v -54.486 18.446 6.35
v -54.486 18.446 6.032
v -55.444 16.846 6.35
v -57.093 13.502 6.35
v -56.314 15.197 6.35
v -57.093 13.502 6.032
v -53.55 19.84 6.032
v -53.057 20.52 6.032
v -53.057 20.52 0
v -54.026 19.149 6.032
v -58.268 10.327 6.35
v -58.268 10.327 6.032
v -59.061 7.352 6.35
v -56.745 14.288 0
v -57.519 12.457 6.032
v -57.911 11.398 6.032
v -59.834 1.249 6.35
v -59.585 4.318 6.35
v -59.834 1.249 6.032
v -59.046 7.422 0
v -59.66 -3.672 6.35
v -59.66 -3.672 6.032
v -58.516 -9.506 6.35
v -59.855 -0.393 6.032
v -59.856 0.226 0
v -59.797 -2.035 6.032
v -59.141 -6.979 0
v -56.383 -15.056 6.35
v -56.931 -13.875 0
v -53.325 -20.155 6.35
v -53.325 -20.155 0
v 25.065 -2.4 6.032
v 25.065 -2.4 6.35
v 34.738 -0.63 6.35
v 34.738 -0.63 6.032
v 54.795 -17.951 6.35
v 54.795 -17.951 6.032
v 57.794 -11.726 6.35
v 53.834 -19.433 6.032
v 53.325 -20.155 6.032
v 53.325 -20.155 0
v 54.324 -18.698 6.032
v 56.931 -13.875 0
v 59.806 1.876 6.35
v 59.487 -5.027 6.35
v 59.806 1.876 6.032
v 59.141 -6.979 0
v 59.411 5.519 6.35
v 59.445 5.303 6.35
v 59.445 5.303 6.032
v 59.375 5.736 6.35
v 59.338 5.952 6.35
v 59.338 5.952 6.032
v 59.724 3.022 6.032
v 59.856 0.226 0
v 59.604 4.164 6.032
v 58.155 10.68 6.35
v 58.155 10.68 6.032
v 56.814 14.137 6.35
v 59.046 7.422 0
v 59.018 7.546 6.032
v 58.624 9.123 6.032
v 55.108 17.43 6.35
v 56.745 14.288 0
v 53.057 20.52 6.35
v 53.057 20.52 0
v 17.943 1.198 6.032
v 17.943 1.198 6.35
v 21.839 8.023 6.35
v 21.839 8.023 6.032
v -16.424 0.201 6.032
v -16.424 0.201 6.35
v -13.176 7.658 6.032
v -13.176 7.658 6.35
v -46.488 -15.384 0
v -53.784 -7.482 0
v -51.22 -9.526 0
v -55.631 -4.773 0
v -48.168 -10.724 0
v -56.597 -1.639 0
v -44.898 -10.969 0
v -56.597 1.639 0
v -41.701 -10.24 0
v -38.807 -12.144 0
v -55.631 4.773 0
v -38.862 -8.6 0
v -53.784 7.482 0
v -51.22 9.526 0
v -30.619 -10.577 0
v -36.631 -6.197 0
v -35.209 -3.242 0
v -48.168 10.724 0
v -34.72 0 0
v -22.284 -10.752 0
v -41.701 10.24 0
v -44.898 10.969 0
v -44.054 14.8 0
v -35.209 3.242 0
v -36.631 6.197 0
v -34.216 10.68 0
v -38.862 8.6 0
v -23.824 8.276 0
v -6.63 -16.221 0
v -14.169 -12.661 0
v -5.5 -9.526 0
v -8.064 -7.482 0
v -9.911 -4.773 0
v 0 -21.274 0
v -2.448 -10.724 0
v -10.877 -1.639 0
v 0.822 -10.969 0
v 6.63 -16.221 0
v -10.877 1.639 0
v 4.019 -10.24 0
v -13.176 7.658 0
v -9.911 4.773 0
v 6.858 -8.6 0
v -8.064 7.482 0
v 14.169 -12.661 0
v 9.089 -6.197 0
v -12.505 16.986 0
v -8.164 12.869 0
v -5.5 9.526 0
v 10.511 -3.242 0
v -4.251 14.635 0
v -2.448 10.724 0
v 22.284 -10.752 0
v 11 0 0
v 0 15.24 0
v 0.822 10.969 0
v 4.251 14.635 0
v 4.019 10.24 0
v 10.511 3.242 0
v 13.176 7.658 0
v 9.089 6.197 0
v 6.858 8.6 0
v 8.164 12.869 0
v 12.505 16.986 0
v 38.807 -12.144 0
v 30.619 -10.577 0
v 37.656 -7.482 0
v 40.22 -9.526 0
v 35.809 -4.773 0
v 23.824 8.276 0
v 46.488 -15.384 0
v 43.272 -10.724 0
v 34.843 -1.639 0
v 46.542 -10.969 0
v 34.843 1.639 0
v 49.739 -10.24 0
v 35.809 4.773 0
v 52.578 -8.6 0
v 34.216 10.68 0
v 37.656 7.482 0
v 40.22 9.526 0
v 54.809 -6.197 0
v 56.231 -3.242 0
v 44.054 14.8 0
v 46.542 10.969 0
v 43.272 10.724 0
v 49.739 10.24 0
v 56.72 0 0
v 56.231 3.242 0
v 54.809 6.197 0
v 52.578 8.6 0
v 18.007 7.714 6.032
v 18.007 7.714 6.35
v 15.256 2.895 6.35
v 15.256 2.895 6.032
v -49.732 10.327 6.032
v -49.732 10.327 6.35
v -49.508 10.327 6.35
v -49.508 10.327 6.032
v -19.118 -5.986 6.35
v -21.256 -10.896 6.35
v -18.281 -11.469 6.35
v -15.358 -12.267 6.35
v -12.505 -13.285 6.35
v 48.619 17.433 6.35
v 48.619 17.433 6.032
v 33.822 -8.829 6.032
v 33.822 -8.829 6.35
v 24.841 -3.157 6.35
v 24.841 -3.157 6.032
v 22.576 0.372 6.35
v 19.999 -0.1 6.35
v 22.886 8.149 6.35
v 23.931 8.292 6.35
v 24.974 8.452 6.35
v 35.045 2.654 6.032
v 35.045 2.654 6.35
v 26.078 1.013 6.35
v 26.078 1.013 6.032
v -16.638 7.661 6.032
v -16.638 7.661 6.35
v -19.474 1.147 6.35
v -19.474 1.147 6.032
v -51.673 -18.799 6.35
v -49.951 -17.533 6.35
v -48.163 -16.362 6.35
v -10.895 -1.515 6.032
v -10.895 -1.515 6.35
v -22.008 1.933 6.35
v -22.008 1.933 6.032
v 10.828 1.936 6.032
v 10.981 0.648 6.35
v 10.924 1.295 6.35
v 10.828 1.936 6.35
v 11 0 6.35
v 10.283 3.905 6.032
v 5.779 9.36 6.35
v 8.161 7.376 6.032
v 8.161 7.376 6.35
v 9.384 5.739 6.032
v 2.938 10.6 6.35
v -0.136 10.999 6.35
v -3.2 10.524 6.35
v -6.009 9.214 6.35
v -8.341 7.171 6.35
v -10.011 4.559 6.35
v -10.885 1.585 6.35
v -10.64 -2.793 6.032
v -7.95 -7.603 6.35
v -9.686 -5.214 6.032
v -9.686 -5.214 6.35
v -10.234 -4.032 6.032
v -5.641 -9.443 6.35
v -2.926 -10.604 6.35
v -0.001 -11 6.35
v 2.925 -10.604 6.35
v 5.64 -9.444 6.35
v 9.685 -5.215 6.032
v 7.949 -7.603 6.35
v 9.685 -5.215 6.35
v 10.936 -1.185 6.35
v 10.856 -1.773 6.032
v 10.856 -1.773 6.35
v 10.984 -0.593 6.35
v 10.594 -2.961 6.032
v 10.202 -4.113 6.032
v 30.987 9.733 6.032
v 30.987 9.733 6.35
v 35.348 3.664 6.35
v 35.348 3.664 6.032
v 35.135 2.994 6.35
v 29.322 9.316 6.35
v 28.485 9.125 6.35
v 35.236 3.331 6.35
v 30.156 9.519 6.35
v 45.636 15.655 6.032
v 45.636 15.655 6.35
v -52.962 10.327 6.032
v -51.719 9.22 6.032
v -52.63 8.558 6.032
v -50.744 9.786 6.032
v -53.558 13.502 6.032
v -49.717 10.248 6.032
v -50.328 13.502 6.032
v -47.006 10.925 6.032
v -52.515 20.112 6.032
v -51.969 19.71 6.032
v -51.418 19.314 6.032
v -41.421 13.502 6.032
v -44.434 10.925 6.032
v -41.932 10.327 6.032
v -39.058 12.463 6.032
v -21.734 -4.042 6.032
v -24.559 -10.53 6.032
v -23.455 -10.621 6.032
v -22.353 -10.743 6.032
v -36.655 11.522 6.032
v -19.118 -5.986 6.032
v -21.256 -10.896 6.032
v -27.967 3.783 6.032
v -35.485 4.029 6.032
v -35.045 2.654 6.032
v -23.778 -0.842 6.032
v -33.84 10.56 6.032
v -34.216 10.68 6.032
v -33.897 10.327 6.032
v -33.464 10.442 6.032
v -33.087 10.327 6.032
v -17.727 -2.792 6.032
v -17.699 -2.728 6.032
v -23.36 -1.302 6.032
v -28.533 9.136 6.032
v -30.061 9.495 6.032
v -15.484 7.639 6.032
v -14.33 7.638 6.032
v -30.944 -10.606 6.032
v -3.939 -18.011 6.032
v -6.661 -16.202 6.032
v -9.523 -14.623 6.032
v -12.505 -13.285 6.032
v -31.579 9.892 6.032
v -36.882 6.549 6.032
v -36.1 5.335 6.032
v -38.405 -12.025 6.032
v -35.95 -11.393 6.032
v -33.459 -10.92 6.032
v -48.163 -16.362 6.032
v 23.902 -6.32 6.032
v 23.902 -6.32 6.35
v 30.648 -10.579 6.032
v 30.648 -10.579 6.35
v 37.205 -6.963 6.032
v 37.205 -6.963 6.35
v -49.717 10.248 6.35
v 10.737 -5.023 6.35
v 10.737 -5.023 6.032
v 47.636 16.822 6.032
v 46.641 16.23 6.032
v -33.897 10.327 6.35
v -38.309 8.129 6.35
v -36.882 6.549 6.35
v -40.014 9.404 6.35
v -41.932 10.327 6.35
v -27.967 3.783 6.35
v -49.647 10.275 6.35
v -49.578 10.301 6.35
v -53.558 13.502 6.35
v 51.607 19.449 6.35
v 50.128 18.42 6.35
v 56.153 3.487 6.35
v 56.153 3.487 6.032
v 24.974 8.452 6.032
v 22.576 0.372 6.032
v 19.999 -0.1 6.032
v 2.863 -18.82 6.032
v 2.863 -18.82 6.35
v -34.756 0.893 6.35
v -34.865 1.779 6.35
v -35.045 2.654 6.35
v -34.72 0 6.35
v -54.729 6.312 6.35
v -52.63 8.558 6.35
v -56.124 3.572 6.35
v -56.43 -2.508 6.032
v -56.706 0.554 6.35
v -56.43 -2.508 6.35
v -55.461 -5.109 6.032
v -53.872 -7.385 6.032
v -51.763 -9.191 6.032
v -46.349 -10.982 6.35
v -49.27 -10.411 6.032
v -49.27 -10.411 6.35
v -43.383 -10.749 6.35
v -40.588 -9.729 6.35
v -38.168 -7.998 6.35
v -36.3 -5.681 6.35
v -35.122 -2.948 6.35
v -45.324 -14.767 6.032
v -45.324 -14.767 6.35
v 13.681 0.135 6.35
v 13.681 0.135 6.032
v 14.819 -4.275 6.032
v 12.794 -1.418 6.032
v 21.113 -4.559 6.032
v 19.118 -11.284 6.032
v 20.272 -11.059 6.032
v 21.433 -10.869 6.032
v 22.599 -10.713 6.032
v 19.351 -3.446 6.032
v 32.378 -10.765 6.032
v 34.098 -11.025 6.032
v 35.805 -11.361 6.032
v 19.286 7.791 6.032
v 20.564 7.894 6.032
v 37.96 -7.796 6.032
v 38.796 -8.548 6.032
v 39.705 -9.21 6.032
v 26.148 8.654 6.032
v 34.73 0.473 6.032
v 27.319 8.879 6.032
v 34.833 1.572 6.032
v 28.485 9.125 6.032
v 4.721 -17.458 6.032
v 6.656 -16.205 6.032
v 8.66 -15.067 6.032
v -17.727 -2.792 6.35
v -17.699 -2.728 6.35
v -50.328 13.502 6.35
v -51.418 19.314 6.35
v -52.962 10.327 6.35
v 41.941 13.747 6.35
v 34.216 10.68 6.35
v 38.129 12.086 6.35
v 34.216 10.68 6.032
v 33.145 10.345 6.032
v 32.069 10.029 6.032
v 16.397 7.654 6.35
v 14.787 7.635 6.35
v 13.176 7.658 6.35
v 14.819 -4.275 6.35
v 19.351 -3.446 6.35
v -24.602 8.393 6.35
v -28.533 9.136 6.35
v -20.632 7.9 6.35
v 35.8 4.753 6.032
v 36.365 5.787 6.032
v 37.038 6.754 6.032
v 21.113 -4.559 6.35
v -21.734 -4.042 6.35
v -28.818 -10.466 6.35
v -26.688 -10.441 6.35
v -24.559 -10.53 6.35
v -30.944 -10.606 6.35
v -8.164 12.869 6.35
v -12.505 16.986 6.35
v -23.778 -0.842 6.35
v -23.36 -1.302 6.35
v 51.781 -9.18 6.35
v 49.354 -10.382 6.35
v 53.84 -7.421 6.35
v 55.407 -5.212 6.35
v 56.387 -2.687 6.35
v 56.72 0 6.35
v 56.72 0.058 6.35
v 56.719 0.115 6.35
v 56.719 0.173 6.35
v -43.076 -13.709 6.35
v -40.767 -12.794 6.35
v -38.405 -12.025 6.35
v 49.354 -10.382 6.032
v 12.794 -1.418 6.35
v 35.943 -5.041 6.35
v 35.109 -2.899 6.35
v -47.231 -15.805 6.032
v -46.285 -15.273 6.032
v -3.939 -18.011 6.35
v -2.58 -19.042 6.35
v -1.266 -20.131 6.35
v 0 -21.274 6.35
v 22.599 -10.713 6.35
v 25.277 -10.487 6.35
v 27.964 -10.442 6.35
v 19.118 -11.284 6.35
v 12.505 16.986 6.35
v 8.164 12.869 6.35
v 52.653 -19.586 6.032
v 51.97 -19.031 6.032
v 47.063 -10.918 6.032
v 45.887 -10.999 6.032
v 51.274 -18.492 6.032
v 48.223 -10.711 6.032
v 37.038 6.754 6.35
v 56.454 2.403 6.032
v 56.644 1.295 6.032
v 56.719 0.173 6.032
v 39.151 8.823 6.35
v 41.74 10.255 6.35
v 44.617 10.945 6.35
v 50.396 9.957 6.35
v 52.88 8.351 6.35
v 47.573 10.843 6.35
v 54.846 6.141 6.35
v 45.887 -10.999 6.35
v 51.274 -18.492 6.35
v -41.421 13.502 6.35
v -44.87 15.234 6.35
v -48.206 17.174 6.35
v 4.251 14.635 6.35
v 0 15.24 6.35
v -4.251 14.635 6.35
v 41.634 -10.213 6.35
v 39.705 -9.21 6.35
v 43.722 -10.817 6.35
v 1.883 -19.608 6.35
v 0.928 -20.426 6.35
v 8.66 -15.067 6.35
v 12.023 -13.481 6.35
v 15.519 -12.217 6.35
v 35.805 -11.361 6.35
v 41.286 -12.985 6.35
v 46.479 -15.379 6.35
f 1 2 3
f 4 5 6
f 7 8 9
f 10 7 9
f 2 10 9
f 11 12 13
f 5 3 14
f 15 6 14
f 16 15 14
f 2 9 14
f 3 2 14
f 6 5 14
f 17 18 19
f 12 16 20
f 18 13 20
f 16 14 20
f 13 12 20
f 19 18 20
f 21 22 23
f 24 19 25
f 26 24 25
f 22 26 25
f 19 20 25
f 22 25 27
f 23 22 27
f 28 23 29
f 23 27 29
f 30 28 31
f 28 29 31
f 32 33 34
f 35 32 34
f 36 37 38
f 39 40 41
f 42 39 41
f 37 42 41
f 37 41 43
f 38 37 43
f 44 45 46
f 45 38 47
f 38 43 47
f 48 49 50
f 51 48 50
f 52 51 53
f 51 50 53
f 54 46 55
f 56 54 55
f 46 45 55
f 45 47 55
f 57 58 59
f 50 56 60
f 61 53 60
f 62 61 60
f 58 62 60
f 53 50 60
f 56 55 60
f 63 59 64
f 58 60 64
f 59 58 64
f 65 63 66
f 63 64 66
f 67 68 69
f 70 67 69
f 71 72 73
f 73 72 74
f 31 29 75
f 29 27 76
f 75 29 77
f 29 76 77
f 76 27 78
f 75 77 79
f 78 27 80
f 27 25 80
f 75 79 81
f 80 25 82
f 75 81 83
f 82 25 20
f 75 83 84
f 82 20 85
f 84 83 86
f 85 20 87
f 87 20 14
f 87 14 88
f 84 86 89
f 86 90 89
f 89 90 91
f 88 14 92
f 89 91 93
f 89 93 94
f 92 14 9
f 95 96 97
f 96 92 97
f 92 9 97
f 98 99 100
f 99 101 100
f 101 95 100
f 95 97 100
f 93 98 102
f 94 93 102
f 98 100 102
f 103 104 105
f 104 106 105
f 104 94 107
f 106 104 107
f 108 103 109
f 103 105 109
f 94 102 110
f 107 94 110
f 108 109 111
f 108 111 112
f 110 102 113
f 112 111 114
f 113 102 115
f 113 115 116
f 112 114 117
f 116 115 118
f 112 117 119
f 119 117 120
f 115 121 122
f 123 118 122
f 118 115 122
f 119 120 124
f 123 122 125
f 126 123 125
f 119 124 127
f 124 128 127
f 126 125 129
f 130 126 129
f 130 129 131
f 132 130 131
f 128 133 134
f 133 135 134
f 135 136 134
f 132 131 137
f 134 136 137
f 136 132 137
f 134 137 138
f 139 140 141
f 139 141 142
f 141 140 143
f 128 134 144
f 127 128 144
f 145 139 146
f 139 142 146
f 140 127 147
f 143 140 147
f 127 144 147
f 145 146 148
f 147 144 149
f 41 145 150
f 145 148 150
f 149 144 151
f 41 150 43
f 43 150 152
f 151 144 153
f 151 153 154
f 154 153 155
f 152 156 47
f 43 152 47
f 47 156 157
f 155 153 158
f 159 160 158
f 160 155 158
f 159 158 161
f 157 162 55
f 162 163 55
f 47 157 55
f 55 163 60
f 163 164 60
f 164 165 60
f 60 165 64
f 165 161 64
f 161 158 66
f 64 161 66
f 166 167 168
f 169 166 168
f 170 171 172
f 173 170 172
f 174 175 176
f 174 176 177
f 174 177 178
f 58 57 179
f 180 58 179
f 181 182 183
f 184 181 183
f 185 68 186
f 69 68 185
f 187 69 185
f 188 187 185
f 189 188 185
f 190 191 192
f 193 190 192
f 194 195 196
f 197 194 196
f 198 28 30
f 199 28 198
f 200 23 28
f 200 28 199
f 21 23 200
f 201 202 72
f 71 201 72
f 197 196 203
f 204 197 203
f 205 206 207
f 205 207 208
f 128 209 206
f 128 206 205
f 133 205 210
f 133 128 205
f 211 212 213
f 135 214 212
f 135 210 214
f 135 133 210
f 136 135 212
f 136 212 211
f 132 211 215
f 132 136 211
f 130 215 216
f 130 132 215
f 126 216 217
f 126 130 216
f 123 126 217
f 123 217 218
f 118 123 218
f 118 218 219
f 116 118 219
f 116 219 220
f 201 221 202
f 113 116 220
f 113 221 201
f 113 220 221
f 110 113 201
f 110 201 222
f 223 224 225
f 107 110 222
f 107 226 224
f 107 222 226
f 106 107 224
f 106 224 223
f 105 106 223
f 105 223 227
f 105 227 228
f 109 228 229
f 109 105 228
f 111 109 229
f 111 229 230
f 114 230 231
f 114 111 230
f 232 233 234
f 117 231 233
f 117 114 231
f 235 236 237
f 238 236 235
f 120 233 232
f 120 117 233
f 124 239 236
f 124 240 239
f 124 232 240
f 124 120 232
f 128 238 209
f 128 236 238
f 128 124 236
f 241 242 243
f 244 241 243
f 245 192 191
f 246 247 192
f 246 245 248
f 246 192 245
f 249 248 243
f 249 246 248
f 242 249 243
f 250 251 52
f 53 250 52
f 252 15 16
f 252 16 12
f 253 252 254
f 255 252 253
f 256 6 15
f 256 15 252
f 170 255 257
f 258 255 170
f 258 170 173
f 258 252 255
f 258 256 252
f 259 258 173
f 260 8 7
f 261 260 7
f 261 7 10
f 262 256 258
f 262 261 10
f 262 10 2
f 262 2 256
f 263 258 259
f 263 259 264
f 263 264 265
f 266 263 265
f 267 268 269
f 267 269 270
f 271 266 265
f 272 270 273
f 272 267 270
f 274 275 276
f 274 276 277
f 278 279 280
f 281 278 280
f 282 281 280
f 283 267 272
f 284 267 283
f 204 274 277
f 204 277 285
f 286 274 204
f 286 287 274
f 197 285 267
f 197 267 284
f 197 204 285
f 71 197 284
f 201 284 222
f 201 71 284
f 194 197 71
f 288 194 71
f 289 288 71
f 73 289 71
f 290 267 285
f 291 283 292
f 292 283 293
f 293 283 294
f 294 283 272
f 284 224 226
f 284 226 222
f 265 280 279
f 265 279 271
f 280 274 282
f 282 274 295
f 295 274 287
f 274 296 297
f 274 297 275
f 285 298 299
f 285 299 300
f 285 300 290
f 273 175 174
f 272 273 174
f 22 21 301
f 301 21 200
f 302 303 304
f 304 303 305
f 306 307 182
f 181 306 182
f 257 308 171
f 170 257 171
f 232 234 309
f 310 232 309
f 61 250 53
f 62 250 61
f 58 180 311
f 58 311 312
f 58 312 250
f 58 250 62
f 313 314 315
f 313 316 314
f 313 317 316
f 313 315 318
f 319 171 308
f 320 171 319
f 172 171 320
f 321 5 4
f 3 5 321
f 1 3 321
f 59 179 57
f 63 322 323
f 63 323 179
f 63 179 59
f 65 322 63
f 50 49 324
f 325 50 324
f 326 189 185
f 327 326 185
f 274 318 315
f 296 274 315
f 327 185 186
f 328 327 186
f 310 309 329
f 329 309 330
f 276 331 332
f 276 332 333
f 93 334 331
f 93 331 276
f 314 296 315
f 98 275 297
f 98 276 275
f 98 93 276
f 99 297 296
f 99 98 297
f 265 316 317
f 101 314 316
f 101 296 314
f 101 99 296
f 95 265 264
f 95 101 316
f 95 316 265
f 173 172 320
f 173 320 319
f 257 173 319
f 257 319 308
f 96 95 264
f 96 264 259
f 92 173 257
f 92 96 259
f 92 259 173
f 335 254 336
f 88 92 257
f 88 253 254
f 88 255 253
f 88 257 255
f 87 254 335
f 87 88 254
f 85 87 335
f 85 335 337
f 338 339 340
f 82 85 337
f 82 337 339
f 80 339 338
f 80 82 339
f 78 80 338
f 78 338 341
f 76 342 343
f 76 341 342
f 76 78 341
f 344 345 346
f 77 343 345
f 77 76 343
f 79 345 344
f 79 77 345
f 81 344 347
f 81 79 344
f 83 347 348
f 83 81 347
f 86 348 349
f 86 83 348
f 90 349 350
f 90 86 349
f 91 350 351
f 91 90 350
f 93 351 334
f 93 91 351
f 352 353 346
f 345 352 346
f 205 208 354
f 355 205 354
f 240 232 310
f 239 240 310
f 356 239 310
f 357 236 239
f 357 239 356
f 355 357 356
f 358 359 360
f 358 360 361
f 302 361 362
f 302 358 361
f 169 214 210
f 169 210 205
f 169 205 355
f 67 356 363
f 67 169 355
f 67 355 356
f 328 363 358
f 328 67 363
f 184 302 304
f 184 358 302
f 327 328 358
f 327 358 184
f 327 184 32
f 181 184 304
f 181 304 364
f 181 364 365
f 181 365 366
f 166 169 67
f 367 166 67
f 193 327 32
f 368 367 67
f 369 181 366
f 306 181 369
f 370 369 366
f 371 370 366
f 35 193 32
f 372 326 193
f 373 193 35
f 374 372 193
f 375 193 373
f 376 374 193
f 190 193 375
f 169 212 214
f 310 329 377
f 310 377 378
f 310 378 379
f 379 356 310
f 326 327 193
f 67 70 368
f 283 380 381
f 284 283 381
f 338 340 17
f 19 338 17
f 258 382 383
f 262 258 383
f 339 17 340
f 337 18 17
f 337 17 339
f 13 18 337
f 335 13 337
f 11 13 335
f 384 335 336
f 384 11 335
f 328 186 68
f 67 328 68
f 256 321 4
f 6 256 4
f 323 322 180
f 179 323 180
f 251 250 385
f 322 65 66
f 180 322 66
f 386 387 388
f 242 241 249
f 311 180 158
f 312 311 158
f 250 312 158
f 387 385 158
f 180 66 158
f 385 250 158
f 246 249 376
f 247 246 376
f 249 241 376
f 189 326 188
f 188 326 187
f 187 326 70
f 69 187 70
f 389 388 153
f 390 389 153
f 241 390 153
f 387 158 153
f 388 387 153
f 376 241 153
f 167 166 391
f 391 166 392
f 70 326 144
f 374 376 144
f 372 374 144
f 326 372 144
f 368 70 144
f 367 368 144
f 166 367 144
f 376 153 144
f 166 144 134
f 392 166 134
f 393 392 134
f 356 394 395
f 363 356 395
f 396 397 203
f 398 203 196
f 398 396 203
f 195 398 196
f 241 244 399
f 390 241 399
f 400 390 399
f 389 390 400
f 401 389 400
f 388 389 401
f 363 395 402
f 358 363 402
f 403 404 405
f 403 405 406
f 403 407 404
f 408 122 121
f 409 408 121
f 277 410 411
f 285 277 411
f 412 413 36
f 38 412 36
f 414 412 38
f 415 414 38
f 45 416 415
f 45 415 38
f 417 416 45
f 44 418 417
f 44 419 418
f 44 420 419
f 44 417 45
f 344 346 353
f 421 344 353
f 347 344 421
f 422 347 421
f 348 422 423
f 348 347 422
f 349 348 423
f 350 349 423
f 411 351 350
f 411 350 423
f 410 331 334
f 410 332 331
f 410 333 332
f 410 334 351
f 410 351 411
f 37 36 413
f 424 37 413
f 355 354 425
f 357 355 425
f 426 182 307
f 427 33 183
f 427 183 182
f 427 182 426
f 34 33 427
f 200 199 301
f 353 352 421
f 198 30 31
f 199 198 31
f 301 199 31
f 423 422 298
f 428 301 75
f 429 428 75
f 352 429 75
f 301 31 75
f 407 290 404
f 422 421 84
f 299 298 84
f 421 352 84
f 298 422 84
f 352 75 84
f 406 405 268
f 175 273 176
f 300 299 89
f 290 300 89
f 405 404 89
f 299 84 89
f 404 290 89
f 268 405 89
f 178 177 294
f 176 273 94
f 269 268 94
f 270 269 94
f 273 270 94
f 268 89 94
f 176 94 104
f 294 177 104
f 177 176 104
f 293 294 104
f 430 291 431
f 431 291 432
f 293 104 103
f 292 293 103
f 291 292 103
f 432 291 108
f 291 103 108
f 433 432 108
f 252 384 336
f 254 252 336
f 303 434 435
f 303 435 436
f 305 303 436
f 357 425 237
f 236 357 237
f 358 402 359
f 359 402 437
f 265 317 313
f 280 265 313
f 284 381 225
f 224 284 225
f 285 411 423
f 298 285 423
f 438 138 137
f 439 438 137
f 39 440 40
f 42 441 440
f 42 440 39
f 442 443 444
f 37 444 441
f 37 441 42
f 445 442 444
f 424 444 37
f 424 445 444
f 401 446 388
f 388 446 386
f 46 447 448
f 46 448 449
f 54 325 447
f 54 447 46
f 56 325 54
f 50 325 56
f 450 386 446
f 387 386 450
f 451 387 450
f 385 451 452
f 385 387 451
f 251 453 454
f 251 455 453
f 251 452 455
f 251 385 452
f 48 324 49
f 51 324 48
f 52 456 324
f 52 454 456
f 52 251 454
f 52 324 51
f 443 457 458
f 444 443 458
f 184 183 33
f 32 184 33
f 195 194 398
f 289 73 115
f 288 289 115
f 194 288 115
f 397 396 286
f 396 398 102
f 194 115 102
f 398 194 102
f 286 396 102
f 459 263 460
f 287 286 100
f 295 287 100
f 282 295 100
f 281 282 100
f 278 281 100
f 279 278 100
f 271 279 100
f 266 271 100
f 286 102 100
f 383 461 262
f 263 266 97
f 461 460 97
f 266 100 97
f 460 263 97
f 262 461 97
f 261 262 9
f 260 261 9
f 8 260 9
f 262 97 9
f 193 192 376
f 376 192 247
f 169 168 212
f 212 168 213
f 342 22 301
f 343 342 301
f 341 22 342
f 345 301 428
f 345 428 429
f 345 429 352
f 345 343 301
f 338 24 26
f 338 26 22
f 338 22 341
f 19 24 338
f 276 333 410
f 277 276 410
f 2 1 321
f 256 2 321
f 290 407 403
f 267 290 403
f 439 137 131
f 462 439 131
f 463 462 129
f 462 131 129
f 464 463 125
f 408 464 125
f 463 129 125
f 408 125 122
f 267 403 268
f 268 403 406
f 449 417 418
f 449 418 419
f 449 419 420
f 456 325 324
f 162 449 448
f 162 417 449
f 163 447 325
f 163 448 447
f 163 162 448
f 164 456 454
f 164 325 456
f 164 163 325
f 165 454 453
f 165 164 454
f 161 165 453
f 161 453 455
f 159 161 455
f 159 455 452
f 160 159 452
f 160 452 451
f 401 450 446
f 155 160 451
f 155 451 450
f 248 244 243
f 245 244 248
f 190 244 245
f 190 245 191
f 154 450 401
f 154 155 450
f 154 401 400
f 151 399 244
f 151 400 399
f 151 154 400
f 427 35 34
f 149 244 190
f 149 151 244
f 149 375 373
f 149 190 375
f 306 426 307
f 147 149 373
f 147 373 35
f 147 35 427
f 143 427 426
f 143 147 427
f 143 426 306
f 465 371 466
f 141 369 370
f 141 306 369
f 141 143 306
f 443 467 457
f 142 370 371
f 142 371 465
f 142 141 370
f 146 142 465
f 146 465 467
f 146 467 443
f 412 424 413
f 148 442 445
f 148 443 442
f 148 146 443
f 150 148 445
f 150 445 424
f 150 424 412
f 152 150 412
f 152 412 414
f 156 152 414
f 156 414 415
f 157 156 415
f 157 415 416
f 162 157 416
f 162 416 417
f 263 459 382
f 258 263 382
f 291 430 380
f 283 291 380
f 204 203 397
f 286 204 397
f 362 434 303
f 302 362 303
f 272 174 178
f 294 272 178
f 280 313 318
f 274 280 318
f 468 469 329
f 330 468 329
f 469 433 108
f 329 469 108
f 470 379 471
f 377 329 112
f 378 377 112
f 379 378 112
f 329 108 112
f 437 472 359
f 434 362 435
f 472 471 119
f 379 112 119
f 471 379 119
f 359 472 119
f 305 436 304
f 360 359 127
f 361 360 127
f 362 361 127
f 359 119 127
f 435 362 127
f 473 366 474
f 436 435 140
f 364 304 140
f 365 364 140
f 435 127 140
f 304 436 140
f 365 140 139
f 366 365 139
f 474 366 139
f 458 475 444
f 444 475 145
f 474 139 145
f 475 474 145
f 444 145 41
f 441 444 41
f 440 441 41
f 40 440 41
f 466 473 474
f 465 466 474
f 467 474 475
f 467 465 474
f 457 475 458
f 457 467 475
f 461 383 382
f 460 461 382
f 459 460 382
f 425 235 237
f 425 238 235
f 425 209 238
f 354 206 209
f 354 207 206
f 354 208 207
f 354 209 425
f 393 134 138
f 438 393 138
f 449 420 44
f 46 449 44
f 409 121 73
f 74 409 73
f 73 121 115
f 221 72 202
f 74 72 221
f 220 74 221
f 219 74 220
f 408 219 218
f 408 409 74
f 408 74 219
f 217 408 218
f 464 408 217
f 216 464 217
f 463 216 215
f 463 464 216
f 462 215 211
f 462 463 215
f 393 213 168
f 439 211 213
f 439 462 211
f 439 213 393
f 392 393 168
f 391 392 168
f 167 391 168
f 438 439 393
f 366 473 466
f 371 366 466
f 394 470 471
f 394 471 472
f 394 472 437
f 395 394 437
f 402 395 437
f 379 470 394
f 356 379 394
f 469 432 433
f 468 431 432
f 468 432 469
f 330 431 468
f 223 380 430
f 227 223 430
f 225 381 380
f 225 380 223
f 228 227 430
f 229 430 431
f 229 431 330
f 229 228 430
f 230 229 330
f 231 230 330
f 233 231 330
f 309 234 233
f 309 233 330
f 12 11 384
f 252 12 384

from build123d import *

# Parameters (mm, degrees)
F1_R     = 11
F2_DEPTH = 6.35
F6_DEPTH = 0.3175


with BuildPart() as f2:
    # F1 (on Top) → F2 (new body)
    with BuildSketch(Plane.XY):
        with BuildLine():
            Line((0, -21.2744697928), (-3.9617014267, -14.7160633936))
            ThreePointArc((-3.9617014267, -14.7160633936), (-14.0916920779, -5.8036035686), (-13.1763023875, 7.6578492669))
            ThreePointArc((-13.1763023875, 7.6578492669), (-34.2159424621, 10.6798365178), (-53.0567593104, 20.5196780766))
            ThreePointArc((-53.0567593104, 20.5196780766), (-59.8561977211, 0.2263484753), (-53.3247157398, -20.1548029185))
            ThreePointArc((-53.3247157398, -20.1548029185), (-26.446732511, -10.4453667792), (0, -21.2744697928))
        make_face()
        with Locations((-45.72, 0)):
            Circle(F1_R, mode=Mode.SUBTRACT)
        with BuildLine():
            ThreePointArc((-13.1763023875, 7.6578492669), (-10.9837744966, 10.5647668127), (-8.1642887679, 12.8686436315))
            Line((-8.1642887679, 12.8686436315), (-12.5048465535, 16.9855731691))
            Line((-12.5048465535, 16.9855731691), (-13.1763023875, 7.6578492669))
        make_face()
        with BuildLine():
            ThreePointArc((8.1642887679, 12.8686436315), (10.9837744966, 10.5647668127), (13.1763023875, 7.6578492669))
            Line((13.1763023875, 7.6578492669), (12.5048465535, 16.9855731691))
            Line((12.5048465535, 16.9855731691), (8.1642887679, 12.8686436315))
        make_face()
        with BuildLine():
            Line((0, -21.2744697928), (3.9617014267, -14.7160633936))
            ThreePointArc((3.9617014267, -14.7160633936), (0, -15.24), (-3.9617014267, -14.7160633936))
            Line((-3.9617014267, -14.7160633936), (0, -21.2744697928))
        make_face()
        with BuildLine():
            ThreePointArc((3.9617014267, -14.7160633936), (12.0961549623, -9.2704172036), (15.24, 0))
            ThreePointArc((15.24, 0), (14.7150339515, 3.9655233964), (13.1763023875, 7.6578492669))
            ThreePointArc((13.1763023875, 7.6578492669), (10.9837744966, 10.5647668127), (8.1642887679, 12.8686436315))
            ThreePointArc((8.1642887679, 12.8686436315), (0, 15.24), (-8.1642887679, 12.8686436315))
            ThreePointArc((-8.1642887679, 12.8686436315), (-10.9837744966, 10.5647668127), (-13.1763023875, 7.6578492669))
            ThreePointArc((-13.1763023875, 7.6578492669), (-14.0916920779, -5.8036035686), (-3.9617014267, -14.7160633936))
            ThreePointArc((-3.9617014267, -14.7160633936), (0, -15.24), (3.9617014267, -14.7160633936))
        make_face()
        Circle(F1_R, mode=Mode.SUBTRACT)
        with BuildLine():
            ThreePointArc((13.1763023875, 7.6578492669), (14.7150339515, 3.9655233964), (15.24, 0))
            ThreePointArc((15.24, 0), (12.0961549623, -9.2704172036), (3.9617014267, -14.7160633936))
            Line((3.9617014267, -14.7160633936), (0, -21.2744697928))
            ThreePointArc((0, -21.2744697928), (26.446732511, -10.4453667792), (53.3247157398, -20.1548029185))
            ThreePointArc((53.3247157398, -20.1548029185), (59.8561977211, 0.2263484753), (53.0567593104, 20.5196780766))
            ThreePointArc((53.0567593104, 20.5196780766), (34.2159424621, 10.6798365178), (13.1763023875, 7.6578492669))
        make_face()
        with Locations((45.72, 0)):
            Circle(F1_R, mode=Mode.SUBTRACT)
    extrude(amount=F2_DEPTH)

    # F4: F2 across plane


with BuildPart() as f2_1:
    add(f2.part)
    add(f2.part.mirror(Plane.XY.offset(3.175)), mode=Mode.INTERSECT)

    # F5 (on face) → F6 (cut)
    with BuildSketch(Plane.XY.offset(6.35)):
        with BuildLine():
            Line((-33.0867251205, 10.3273102228), (-33.8965651377, 10.3273102228))
            Line((-33.8965651377, 10.3273102228), (-27.9672857299, 3.7826160877))
            Line((-27.9672857299, 3.7826160877), (-36.8817018288, 6.5486246982))
            ThreePointArc((-36.8817018288, 6.5486246982), (-35.7709952356, 4.6922600309), (-35.0450733013, 2.6544189528))
            Line((-35.0450733013, 2.6544189528), (-23.777877053, -0.8416217854))
            Line((-23.777877053, -0.8416217854), (-23.3603945078, -1.3024358872))
            Line((-23.3603945078, -1.3024358872), (-38.4050425364, -12.0245541076))
            ThreePointArc((-38.4050425364, -12.0245541076), (-34.7082419636, -11.1365012415), (-30.9435157655, -10.6056443669))
            Line((-30.9435157655, -10.6056443669), (-21.7343333799, -4.0423839925))
            Line((-21.7343333799, -4.0423839925), (-24.5594222217, -10.5298927816))
            ThreePointArc((-24.5594222217, -10.5298927816), (-22.9037940861, -10.6783462725), (-21.2558190336, -10.8958806112))
            Line((-21.2558190336, -10.8958806112), (-19.1175726849, -5.9856307902))
            Line((-19.1175726849, -5.9856307902), (-12.5048465535, -13.2847082923))
            ThreePointArc((-12.5048465535, -13.2847082923), (-8.0758913439, -15.3833181537), (-3.9388128262, -18.0109385482))
            Line((-3.9388128262, -18.0109385482), (-17.7267967393, -2.7918653278))
            Line((-17.7267967393, -2.7918653278), (-17.8183960606, -2.690758684))
            Line((-17.8183960606, -2.690758684), (-17.6989126602, -2.7278325777))
            Line((-17.6989126602, -2.7278325777), (-9.6856513623, -5.2142264707))
            ThreePointArc((-9.6856513623, -5.2142264707), (-10.4553816006, -3.4183322814), (-10.89522981, -1.5145848898))
            Line((-10.89522981, -1.5145848898), (-16.4235996876, 0.2007847445))
            Line((-16.4235996876, 0.2007847445), (-13.1763023875, 7.6578492669))
            ThreePointArc((-13.1763023875, 7.6578492669), (-14.9072183672, 7.6354518608), (-16.6380970373, 7.6605676364))
            Line((-16.6380970373, 7.6605676364), (-19.4743635012, 1.147390656))
            Line((-19.4743635012, 1.147390656), (-22.0078047375, 1.933479189))
            Line((-22.0078047375, 1.933479189), (-28.5329704562, 9.1359081644))
            ThreePointArc((-28.5329704562, 9.1359081644), (-30.8209665406, 9.6891113065), (-33.0867251205, 10.3273102228))
        make_face()
        Polygon((-21.2140333894, -3.6715731901), (-21.7343333799, -4.0423839925), (-21.4563736727, -3.4040798031), align=None, mode=Mode.SUBTRACT)
        with BuildLine():
            Line((15.2562559493, 2.8950779034), (8.1607648929, 7.3757654764))
            ThreePointArc((8.1607648929, 7.3757654764), (9.876376857, 4.8432613164), (10.828250906, 1.9362288904))
            Line((10.828250906, 1.9362288904), (13.6808634902, 0.1348502888))
            Line((13.6808634902, 0.1348502888), (12.7943901494, -1.4183297972))
            Line((12.7943901494, -1.4183297972), (10.8561561819, -1.7730969953))
            ThreePointArc((10.8561561819, -1.7730969953), (10.413844837, -3.5428569984), (9.6851364245, -5.2151828768))
            Line((9.6851364245, -5.2151828768), (10.737259112, -5.0226062199))
            Line((10.737259112, -5.0226062199), (2.8625832994, -18.8197381724))
            ThreePointArc((2.8625832994, -18.8197381724), (5.6796409679, -16.8174500762), (8.659958175, -15.0673983988))
            Line((8.659958175, -15.0673983988), (14.8194526711, -4.2754165641))
            Line((14.8194526711, -4.2754165641), (19.3512821981, -3.4459271988))
            Line((19.3512821981, -3.4459271988), (21.1131281148, -4.5585043329))
            Line((21.1131281148, -4.5585043329), (23.9023253439, -6.3198371658))
            Line((23.9023253439, -6.3198371658), (30.6476267102, -10.5793856266))
            ThreePointArc((30.6476267102, -10.5793856266), (33.239021799, -10.8855505762), (35.8047499487, -11.3610550922))
            Line((35.8047499487, -11.3610550922), (36.8868348984, -10.7642820371))
            Line((36.8868348984, -10.7642820371), (39.7052411081, -9.2099226638))
            ThreePointArc((39.7052411081, -9.2099226638), (38.3685492146, -8.182675073), (37.2045242378, -6.9632372172))
            Line((37.2045242378, -6.9632372172), (33.8218485778, -8.8287928639))
            Line((33.8218485778, -8.8287928639), (24.8407004508, -3.1573434203))
            Line((24.8407004508, -3.1573434203), (25.065409153, -2.4000344721))
            Line((25.065409153, -2.4000344721), (34.7380323974, -0.6295931817))
            ThreePointArc((34.7380323974, -0.6295931817), (34.7677616902, 1.0239511728), (35.0450561709, 2.6543500609))
            Line((35.0450561709, 2.6543500609), (26.0781485443, 1.0130803549))
            Line((26.0781485443, 1.0130803549), (28.4852120842, 9.1253196222))
            ThreePointArc((28.4852120842, 9.1253196222), (26.7341804846, 8.7637670313), (24.9736036439, 8.4519960794))
            Line((24.9736036439, 8.4519960794), (22.5761322902, 0.3720842136))
            Line((22.5761322902, 0.3720842136), (19.9986764969, -0.0996837903))
            Line((19.9986764969, -0.0996837903), (17.9434726534, 1.1981441188))
            Line((17.9434726534, 1.1981441188), (21.8387350818, 8.0229901179))
            ThreePointArc((21.8387350818, 8.0229901179), (19.9250706714, 7.8393377288), (18.0066978386, 7.7140965624))
            Line((18.0066978386, 7.7140965624), (15.2562559493, 2.8950779034))
        make_face()
        with BuildLine():
            ThreePointArc((-53.0567593104, 20.5196780766), (-53.7901878387, 19.495997689), (-54.4856112515, 18.4461285452))
            Line((-54.4856112515, 18.4461285452), (-53.5579545513, 13.5023102228))
            Line((-53.5579545513, 13.5023102228), (-57.0927274917, 13.5023102228))
            ThreePointArc((-57.0927274917, 13.5023102228), (-57.7195853166, 11.9292969924), (-58.2681832984, 10.3273102228))
            Line((-58.2681832984, 10.3273102228), (-52.962198431, 10.3273102228))
            Line((-52.962198431, 10.3273102228), (-52.6302978511, 8.5584919004))
            ThreePointArc((-52.6302978511, 8.5584919004), (-51.238664738, 9.5154789427), (-49.7169340331, 10.2481470684))
            Line((-49.7169340331, 10.2481470684), (-49.7317881854, 10.3273102228))
            Line((-49.7317881854, 10.3273102228), (-49.5076989799, 10.3273102228))
            ThreePointArc((-49.5076989799, 10.3273102228), (-45.72, 11), (-41.9323010201, 10.3273102228))
            Line((-41.9323010201, 10.3273102228), (-33.8965651377, 10.3273102228))
            Line((-33.8965651377, 10.3273102228), (-34.2159424621, 10.6798365178))
            ThreePointArc((-34.2159424621, 10.6798365178), (-37.8617750601, 11.9804673674), (-41.4209505634, 13.5023102228))
            Line((-41.4209505634, 13.5023102228), (-50.3275443057, 13.5023102228))
            Line((-50.3275443057, 13.5023102228), (-51.4179553631, 19.313505424))
            ThreePointArc((-51.4179553631, 19.313505424), (-52.2422221405, 19.9099820336), (-53.0567593104, 20.5196780766))
        make_face()
        with BuildLine():
            Line((-56.4303159965, -2.5078140393), (-59.834220327, 1.2493900283))
            ThreePointArc((-59.834220327, 1.2493900283), (-59.8354822635, -1.214212745), (-59.6602114445, -3.6715731901))
            Line((-59.6602114445, -3.6715731901), (-48.1628733894, -16.3622486943))
            ThreePointArc((-48.1628733894, -16.3622486943), (-46.7598407585, -15.5354203248), (-45.3241222503, -14.7667473894))
            Line((-45.3241222503, -14.7667473894), (-49.2698756194, -10.4114544175))
            ThreePointArc((-49.2698756194, -10.4114544175), (-53.8720027623, -7.3854485959), (-56.4303159965, -2.5078140393))
        make_face()
        with BuildLine():
            ThreePointArc((48.6193464819, 17.4331088222), (47.1398450994, 16.5237414768), (45.6358669143, 15.6554541232))
            Line((45.6358669143, 15.6554541232), (59.3375333115, 5.9517546057))
            ThreePointArc((59.3375333115, 5.9517546057), (58.8302028659, 8.336789193), (58.1549966776, 10.6798365178))
            Line((58.1549966776, 10.6798365178), (48.6193464819, 17.4331088222))
        make_face()
        with BuildLine():
            Line((45.8874761829, -10.9987250047), (51.2736430216, -18.4924738944))
            ThreePointArc((51.2736430216, -18.4924738944), (52.3129823875, -19.3066074996), (53.3247157398, -20.1548029185))
            ThreePointArc((53.3247157398, -20.1548029185), (54.0809297424, -19.0671894684), (54.7946581697, -17.9512350039))
            Line((54.7946581697, -17.9512350039), (49.3544126008, -10.3822466281))
            ThreePointArc((49.3544126008, -10.3822466281), (47.6457728262, -10.8301153744), (45.8874761829, -10.9987250047))
        make_face()
        with BuildLine():
            ThreePointArc((34.2159424621, 10.6798365178), (32.6076224076, 10.1847271174), (30.9866653992, 9.7327037853))
            Line((30.9866653992, 9.7327037853), (35.3482953178, 3.6643883508))
            ThreePointArc((35.3482953178, 3.6643883508), (36.0685366986, 5.2772394433), (37.037645152, 6.7540146796))
            Line((37.037645152, 6.7540146796), (34.2159424621, 10.6798365178))
        make_face()
        with BuildLine():
            Line((21.1131281148, -4.5585043329), (19.1175879927, -11.2838352887))
            ThreePointArc((19.1175879927, -11.2838352887), (20.8518057848, -10.9599591005), (22.5986849132, -10.7133410833))
            Line((22.5986849132, -10.7133410833), (23.9023253439, -6.3198371658))
            Line((23.9023253439, -6.3198371658), (21.1131281148, -4.5585043329))
        make_face()
        with BuildLine():
            Line((59.4453053256, 5.3026194345), (56.1527578647, 3.4867697567))
            ThreePointArc((56.1527578647, 3.4867697567), (56.5630362514, 1.8516384236), (56.7186392424, 0.1730168046))
            Line((56.7186392424, 0.1730168046), (59.8057154927, 1.8755485011))
            ThreePointArc((59.8057154927, 1.8755485011), (59.6685009659, 3.593605098), (59.4453053256, 5.3026194345))
        make_face()
        with BuildLine():
            ThreePointArc((-33.0867251205, 10.3273102228), (-33.6521603479, 10.5009257322), (-34.2159424621, 10.6798365178))
            Line((-34.2159424621, 10.6798365178), (-33.8965651377, 10.3273102228))
            Line((-33.8965651377, 10.3273102228), (-33.0867251205, 10.3273102228))
        make_face()
        Polygon((-21.7343333799, -4.0423839925), (-21.2140333894, -3.6715731901), (-21.4563736727, -3.4040798031), align=None)
        Polygon((-17.6989126602, -2.7278325777), (-17.8183960606, -2.690758684), (-17.7267967393, -2.7918653278), align=None)
    extrude(amount=-F6_DEPTH, mode=Mode.SUBTRACT)


solid = f2_1.part
